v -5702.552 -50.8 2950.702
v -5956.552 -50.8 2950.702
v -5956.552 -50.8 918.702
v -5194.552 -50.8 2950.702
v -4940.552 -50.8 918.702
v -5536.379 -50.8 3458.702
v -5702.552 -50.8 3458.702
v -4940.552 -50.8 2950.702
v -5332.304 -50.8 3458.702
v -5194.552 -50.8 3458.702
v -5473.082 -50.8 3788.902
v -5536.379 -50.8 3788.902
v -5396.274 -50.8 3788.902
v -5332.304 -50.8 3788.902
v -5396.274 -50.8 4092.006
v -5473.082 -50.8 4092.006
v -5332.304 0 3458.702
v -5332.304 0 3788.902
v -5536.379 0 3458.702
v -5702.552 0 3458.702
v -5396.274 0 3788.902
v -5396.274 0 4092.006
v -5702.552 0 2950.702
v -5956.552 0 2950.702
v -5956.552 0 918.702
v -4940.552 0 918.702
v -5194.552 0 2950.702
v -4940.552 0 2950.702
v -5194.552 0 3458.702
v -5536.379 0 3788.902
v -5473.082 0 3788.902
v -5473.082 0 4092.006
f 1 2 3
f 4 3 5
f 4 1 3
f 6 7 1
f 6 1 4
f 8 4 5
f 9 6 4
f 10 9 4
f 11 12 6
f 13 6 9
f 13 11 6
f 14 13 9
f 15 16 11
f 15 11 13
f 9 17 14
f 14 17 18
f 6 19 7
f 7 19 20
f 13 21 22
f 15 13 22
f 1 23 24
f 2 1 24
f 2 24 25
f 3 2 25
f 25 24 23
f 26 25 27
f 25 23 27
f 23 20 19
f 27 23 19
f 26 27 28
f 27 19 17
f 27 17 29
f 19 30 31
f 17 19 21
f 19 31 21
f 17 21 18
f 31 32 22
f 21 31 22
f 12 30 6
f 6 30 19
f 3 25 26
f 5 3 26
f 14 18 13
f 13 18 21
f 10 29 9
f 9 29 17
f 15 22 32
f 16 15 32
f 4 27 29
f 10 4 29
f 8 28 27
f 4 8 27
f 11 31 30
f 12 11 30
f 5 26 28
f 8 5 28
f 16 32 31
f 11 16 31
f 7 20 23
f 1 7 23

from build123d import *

# Parameters (mm, degrees)
F1_DEPTH = 50.8
F2_DEPTH = 50.8


with BuildPart() as f1:
    # F0 (on Front) → F1 (new body)
    with BuildSketch(Plane.XZ):
        Polygon((-5956.551552, 2950.701828), (-5956.551552, 918.701828), (-4940.551552, 918.701828), (-4940.551552, 1934.701828), (-4940.551552, 2471.261024), (-4940.551552, 2950.701828), (-5194.551552, 2950.701828), (-5194.551552, 3458.701828), (-5332.304001, 3458.701828), (-5332.304001, 3788.901828), (-5396.27409, 3788.901828), (-5396.27409, 4092.006207), (-5468.426704, 4092.006207), (-5473.082066, 4092.006207), (-5473.082066, 3788.901828), (-5536.37886, 3788.901828), (-5536.37886, 3458.701828), (-5702.551552, 3458.701828), (-5702.551552, 2950.701828), align=None)
    extrude(amount=F1_DEPTH)

    # F0 (on Front) → F2 (join)
    with BuildSketch(Plane.XZ):
        Polygon((-5956.551552, 2950.701828), (-5956.551552, 918.701828), (-4940.551552, 918.701828), (-4940.551552, 1934.701828), (-4940.551552, 2471.261024), (-4940.551552, 2950.701828), (-5194.551552, 2950.701828), (-5194.551552, 3458.701828), (-5332.304001, 3458.701828), (-5332.304001, 3788.901828), (-5396.27409, 3788.901828), (-5396.27409, 4092.006207), (-5468.426704, 4092.006207), (-5473.082066, 4092.006207), (-5473.082066, 3788.901828), (-5536.37886, 3788.901828), (-5536.37886, 3458.701828), (-5702.551552, 3458.701828), (-5702.551552, 2950.701828), align=None)
    extrude(amount=F2_DEPTH)


solid = f1.part
